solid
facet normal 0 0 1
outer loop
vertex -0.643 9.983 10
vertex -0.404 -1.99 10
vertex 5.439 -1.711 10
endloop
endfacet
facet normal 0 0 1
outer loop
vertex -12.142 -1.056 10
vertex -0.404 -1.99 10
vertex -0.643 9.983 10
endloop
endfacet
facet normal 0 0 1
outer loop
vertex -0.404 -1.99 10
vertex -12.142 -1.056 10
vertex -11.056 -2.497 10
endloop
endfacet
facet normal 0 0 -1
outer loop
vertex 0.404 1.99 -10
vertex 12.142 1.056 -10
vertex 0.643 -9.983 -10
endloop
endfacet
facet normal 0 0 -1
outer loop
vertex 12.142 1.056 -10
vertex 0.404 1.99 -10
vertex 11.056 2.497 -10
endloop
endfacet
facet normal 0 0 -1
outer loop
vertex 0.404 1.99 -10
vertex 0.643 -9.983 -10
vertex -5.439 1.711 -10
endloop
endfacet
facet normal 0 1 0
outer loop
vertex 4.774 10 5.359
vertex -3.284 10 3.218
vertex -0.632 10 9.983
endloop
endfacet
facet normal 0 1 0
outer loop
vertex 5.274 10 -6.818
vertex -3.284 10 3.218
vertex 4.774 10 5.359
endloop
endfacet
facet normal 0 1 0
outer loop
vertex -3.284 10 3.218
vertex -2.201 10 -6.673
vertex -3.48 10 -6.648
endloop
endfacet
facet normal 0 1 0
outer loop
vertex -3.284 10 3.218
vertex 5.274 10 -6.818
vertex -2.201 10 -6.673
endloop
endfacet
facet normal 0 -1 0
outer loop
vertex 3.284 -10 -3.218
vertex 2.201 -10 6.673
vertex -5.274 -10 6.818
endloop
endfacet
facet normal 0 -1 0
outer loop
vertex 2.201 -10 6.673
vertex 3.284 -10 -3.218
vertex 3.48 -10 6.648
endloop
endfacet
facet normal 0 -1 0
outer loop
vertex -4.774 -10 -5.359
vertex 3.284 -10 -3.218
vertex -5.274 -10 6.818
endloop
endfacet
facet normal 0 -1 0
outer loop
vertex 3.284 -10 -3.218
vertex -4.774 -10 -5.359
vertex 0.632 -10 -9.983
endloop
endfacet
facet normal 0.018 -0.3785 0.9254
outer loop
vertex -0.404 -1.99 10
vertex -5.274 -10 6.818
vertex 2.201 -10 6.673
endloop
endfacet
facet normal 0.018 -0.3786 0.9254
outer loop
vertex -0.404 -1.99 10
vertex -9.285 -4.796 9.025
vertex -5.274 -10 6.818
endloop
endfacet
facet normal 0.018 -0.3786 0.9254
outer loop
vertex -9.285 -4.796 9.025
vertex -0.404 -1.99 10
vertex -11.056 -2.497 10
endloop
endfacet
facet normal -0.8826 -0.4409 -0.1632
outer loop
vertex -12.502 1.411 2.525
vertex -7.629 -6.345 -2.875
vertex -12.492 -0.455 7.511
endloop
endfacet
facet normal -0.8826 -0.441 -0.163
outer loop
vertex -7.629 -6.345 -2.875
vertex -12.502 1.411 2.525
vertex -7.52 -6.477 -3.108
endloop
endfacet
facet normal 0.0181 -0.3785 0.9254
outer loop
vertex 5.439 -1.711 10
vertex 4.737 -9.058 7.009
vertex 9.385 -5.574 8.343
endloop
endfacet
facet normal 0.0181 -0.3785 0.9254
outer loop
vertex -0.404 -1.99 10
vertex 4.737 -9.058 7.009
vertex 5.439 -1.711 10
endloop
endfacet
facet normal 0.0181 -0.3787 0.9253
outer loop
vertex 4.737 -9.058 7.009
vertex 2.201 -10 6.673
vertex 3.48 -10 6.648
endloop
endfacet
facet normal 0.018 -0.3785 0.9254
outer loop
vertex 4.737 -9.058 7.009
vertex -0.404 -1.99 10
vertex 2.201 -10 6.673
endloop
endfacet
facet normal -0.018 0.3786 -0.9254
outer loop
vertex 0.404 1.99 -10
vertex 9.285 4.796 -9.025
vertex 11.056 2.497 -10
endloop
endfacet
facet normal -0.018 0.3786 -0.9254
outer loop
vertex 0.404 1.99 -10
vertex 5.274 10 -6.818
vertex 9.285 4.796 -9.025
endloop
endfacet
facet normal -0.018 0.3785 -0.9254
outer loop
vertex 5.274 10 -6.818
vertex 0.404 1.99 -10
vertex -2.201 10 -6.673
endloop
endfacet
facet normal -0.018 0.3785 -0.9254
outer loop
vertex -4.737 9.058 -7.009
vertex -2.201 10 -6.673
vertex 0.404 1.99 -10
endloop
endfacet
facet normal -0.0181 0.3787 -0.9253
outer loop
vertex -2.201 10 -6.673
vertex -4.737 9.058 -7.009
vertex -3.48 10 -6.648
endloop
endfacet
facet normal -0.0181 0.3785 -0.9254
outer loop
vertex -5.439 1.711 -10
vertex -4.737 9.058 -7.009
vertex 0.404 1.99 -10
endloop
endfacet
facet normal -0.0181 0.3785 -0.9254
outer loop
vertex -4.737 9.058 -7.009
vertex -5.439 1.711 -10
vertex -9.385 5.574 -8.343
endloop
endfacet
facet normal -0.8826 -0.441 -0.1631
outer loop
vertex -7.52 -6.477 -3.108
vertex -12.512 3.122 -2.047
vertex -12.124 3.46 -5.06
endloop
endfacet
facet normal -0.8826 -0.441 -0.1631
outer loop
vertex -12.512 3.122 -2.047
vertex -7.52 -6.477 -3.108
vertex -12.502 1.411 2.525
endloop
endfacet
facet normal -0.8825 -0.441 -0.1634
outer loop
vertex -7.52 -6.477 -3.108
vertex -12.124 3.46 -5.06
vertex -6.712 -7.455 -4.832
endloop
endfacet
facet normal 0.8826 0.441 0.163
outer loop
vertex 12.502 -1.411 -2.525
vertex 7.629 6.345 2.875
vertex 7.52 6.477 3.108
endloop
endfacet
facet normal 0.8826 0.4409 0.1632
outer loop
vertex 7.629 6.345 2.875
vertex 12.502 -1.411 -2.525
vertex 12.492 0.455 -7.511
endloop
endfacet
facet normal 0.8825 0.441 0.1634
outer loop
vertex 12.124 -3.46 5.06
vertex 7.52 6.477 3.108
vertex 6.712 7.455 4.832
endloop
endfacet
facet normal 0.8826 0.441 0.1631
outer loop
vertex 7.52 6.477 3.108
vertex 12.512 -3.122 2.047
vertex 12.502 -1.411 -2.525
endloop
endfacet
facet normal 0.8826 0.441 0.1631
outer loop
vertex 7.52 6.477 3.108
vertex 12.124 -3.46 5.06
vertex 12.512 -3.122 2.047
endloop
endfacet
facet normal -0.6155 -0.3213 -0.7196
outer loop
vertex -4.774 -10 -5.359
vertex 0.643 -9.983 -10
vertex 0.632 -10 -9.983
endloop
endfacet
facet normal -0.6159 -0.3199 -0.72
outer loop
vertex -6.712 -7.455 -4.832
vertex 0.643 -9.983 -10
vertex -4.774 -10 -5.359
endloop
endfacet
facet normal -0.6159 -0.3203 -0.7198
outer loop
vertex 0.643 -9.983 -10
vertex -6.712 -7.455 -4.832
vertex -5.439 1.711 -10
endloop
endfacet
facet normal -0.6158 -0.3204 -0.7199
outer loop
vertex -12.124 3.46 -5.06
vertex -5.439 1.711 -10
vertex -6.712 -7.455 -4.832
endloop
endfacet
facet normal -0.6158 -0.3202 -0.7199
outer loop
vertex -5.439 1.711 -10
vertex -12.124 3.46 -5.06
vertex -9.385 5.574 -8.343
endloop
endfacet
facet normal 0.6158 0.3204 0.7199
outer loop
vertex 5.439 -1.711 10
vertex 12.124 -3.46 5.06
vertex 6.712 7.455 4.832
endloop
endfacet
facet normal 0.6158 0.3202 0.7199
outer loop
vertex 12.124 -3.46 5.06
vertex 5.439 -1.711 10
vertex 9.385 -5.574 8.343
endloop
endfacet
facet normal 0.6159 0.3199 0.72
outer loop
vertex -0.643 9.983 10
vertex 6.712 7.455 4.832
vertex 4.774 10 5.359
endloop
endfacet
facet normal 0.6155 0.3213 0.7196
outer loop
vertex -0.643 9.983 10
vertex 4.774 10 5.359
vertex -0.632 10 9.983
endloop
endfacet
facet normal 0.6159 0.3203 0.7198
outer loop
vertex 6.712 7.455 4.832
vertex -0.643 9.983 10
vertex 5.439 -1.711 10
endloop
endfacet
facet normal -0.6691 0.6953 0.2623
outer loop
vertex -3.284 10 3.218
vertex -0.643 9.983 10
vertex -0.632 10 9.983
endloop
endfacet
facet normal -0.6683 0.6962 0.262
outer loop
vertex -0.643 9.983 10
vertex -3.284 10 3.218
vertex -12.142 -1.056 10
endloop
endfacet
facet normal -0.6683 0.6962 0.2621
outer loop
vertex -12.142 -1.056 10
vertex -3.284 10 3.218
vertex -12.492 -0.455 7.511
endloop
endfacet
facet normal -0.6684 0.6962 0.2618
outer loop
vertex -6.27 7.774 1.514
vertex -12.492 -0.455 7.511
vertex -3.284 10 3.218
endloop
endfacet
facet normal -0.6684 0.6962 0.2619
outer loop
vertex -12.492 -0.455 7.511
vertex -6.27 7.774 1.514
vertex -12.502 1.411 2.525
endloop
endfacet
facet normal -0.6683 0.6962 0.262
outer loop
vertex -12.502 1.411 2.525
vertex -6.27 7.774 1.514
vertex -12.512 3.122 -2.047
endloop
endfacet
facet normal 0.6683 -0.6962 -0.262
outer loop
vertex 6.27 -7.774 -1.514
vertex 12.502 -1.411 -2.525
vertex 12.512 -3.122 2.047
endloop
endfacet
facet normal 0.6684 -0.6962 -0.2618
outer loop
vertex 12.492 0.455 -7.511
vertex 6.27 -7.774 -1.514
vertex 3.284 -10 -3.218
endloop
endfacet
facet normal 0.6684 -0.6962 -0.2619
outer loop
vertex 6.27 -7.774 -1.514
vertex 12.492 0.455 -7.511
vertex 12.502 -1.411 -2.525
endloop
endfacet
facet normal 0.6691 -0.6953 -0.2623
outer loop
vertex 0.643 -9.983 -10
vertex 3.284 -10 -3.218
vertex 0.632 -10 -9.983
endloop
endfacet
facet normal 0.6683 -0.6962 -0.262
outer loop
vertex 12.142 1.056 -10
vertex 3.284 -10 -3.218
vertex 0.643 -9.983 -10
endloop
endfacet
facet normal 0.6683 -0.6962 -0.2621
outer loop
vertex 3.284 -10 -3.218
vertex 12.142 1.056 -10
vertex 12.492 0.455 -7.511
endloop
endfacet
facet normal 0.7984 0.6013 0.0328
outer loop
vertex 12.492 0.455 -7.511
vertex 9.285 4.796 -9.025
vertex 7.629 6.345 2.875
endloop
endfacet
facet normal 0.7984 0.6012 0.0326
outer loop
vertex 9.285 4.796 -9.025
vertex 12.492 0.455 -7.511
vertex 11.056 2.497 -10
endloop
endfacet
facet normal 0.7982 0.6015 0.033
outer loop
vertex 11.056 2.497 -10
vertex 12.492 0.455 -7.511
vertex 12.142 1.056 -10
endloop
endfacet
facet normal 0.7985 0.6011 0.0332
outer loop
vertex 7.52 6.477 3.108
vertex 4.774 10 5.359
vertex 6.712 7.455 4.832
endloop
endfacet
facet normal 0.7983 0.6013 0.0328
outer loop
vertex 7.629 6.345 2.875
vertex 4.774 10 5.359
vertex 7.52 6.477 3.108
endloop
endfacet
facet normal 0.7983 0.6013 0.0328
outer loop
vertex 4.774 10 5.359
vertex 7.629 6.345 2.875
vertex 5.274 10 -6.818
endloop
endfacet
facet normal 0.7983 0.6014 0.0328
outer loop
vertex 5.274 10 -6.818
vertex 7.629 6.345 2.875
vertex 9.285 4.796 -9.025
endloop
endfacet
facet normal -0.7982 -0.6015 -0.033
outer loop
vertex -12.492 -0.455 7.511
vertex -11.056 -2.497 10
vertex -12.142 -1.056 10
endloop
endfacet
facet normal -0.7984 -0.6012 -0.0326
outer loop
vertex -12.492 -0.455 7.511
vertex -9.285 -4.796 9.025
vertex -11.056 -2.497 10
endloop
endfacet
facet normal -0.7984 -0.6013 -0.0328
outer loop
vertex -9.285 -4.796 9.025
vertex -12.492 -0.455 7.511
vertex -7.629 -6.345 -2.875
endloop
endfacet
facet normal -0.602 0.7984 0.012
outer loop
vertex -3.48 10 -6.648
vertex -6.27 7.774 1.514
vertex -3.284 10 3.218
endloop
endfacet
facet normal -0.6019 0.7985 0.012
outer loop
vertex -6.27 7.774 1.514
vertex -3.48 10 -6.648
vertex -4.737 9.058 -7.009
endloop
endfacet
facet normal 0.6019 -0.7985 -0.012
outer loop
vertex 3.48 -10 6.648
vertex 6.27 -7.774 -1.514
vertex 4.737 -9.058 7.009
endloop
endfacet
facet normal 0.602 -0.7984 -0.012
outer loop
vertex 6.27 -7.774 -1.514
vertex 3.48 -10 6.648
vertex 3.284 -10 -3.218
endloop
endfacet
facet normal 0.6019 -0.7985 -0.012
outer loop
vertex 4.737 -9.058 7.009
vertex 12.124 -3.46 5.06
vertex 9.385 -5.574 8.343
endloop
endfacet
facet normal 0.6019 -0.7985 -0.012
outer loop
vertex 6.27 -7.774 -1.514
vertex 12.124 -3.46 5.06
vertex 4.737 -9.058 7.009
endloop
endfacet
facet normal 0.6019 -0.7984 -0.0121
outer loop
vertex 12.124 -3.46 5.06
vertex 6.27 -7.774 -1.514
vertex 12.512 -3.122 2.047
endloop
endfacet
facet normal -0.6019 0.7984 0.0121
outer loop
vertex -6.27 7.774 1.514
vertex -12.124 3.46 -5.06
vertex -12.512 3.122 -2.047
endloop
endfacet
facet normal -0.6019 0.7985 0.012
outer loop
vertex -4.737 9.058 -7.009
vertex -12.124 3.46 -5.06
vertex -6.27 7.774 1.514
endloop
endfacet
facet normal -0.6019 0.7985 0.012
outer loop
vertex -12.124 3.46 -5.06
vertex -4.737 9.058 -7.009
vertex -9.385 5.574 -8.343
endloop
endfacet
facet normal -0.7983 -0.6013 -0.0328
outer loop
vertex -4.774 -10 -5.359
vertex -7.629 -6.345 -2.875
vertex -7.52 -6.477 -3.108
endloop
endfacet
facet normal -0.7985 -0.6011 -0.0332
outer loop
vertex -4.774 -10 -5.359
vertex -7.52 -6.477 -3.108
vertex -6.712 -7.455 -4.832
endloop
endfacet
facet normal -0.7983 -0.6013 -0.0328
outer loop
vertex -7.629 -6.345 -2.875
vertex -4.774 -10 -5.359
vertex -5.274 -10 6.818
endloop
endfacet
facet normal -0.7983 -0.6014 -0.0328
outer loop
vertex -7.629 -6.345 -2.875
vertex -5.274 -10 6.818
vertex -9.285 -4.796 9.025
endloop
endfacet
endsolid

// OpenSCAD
echo(version=version());

intersection_for(i = [
			[0, 0, 0],
			[10, 20, 300],
			[200, 40, 57],
			[20, 88, 57]
		])
	rotate(i) cube([100, 20, 20], center = true);

// Written by Clifford Wolf &ltclifford@clifford.at> and Marius
// Kintel &ltmarius@kintel.net>
//
// To the extent possible under law, the author(s) have dedicated all
// copyright and related and neighboring rights to this software to the
// public domain worldwide. This software is distributed without any
// warranty.
//
// You should have received a copy of the CC0 Public Domain
// Dedication along with this software.
// If not, see &lthttp://creativecommons.org/publicdomain/zero/1.0/&gt.
